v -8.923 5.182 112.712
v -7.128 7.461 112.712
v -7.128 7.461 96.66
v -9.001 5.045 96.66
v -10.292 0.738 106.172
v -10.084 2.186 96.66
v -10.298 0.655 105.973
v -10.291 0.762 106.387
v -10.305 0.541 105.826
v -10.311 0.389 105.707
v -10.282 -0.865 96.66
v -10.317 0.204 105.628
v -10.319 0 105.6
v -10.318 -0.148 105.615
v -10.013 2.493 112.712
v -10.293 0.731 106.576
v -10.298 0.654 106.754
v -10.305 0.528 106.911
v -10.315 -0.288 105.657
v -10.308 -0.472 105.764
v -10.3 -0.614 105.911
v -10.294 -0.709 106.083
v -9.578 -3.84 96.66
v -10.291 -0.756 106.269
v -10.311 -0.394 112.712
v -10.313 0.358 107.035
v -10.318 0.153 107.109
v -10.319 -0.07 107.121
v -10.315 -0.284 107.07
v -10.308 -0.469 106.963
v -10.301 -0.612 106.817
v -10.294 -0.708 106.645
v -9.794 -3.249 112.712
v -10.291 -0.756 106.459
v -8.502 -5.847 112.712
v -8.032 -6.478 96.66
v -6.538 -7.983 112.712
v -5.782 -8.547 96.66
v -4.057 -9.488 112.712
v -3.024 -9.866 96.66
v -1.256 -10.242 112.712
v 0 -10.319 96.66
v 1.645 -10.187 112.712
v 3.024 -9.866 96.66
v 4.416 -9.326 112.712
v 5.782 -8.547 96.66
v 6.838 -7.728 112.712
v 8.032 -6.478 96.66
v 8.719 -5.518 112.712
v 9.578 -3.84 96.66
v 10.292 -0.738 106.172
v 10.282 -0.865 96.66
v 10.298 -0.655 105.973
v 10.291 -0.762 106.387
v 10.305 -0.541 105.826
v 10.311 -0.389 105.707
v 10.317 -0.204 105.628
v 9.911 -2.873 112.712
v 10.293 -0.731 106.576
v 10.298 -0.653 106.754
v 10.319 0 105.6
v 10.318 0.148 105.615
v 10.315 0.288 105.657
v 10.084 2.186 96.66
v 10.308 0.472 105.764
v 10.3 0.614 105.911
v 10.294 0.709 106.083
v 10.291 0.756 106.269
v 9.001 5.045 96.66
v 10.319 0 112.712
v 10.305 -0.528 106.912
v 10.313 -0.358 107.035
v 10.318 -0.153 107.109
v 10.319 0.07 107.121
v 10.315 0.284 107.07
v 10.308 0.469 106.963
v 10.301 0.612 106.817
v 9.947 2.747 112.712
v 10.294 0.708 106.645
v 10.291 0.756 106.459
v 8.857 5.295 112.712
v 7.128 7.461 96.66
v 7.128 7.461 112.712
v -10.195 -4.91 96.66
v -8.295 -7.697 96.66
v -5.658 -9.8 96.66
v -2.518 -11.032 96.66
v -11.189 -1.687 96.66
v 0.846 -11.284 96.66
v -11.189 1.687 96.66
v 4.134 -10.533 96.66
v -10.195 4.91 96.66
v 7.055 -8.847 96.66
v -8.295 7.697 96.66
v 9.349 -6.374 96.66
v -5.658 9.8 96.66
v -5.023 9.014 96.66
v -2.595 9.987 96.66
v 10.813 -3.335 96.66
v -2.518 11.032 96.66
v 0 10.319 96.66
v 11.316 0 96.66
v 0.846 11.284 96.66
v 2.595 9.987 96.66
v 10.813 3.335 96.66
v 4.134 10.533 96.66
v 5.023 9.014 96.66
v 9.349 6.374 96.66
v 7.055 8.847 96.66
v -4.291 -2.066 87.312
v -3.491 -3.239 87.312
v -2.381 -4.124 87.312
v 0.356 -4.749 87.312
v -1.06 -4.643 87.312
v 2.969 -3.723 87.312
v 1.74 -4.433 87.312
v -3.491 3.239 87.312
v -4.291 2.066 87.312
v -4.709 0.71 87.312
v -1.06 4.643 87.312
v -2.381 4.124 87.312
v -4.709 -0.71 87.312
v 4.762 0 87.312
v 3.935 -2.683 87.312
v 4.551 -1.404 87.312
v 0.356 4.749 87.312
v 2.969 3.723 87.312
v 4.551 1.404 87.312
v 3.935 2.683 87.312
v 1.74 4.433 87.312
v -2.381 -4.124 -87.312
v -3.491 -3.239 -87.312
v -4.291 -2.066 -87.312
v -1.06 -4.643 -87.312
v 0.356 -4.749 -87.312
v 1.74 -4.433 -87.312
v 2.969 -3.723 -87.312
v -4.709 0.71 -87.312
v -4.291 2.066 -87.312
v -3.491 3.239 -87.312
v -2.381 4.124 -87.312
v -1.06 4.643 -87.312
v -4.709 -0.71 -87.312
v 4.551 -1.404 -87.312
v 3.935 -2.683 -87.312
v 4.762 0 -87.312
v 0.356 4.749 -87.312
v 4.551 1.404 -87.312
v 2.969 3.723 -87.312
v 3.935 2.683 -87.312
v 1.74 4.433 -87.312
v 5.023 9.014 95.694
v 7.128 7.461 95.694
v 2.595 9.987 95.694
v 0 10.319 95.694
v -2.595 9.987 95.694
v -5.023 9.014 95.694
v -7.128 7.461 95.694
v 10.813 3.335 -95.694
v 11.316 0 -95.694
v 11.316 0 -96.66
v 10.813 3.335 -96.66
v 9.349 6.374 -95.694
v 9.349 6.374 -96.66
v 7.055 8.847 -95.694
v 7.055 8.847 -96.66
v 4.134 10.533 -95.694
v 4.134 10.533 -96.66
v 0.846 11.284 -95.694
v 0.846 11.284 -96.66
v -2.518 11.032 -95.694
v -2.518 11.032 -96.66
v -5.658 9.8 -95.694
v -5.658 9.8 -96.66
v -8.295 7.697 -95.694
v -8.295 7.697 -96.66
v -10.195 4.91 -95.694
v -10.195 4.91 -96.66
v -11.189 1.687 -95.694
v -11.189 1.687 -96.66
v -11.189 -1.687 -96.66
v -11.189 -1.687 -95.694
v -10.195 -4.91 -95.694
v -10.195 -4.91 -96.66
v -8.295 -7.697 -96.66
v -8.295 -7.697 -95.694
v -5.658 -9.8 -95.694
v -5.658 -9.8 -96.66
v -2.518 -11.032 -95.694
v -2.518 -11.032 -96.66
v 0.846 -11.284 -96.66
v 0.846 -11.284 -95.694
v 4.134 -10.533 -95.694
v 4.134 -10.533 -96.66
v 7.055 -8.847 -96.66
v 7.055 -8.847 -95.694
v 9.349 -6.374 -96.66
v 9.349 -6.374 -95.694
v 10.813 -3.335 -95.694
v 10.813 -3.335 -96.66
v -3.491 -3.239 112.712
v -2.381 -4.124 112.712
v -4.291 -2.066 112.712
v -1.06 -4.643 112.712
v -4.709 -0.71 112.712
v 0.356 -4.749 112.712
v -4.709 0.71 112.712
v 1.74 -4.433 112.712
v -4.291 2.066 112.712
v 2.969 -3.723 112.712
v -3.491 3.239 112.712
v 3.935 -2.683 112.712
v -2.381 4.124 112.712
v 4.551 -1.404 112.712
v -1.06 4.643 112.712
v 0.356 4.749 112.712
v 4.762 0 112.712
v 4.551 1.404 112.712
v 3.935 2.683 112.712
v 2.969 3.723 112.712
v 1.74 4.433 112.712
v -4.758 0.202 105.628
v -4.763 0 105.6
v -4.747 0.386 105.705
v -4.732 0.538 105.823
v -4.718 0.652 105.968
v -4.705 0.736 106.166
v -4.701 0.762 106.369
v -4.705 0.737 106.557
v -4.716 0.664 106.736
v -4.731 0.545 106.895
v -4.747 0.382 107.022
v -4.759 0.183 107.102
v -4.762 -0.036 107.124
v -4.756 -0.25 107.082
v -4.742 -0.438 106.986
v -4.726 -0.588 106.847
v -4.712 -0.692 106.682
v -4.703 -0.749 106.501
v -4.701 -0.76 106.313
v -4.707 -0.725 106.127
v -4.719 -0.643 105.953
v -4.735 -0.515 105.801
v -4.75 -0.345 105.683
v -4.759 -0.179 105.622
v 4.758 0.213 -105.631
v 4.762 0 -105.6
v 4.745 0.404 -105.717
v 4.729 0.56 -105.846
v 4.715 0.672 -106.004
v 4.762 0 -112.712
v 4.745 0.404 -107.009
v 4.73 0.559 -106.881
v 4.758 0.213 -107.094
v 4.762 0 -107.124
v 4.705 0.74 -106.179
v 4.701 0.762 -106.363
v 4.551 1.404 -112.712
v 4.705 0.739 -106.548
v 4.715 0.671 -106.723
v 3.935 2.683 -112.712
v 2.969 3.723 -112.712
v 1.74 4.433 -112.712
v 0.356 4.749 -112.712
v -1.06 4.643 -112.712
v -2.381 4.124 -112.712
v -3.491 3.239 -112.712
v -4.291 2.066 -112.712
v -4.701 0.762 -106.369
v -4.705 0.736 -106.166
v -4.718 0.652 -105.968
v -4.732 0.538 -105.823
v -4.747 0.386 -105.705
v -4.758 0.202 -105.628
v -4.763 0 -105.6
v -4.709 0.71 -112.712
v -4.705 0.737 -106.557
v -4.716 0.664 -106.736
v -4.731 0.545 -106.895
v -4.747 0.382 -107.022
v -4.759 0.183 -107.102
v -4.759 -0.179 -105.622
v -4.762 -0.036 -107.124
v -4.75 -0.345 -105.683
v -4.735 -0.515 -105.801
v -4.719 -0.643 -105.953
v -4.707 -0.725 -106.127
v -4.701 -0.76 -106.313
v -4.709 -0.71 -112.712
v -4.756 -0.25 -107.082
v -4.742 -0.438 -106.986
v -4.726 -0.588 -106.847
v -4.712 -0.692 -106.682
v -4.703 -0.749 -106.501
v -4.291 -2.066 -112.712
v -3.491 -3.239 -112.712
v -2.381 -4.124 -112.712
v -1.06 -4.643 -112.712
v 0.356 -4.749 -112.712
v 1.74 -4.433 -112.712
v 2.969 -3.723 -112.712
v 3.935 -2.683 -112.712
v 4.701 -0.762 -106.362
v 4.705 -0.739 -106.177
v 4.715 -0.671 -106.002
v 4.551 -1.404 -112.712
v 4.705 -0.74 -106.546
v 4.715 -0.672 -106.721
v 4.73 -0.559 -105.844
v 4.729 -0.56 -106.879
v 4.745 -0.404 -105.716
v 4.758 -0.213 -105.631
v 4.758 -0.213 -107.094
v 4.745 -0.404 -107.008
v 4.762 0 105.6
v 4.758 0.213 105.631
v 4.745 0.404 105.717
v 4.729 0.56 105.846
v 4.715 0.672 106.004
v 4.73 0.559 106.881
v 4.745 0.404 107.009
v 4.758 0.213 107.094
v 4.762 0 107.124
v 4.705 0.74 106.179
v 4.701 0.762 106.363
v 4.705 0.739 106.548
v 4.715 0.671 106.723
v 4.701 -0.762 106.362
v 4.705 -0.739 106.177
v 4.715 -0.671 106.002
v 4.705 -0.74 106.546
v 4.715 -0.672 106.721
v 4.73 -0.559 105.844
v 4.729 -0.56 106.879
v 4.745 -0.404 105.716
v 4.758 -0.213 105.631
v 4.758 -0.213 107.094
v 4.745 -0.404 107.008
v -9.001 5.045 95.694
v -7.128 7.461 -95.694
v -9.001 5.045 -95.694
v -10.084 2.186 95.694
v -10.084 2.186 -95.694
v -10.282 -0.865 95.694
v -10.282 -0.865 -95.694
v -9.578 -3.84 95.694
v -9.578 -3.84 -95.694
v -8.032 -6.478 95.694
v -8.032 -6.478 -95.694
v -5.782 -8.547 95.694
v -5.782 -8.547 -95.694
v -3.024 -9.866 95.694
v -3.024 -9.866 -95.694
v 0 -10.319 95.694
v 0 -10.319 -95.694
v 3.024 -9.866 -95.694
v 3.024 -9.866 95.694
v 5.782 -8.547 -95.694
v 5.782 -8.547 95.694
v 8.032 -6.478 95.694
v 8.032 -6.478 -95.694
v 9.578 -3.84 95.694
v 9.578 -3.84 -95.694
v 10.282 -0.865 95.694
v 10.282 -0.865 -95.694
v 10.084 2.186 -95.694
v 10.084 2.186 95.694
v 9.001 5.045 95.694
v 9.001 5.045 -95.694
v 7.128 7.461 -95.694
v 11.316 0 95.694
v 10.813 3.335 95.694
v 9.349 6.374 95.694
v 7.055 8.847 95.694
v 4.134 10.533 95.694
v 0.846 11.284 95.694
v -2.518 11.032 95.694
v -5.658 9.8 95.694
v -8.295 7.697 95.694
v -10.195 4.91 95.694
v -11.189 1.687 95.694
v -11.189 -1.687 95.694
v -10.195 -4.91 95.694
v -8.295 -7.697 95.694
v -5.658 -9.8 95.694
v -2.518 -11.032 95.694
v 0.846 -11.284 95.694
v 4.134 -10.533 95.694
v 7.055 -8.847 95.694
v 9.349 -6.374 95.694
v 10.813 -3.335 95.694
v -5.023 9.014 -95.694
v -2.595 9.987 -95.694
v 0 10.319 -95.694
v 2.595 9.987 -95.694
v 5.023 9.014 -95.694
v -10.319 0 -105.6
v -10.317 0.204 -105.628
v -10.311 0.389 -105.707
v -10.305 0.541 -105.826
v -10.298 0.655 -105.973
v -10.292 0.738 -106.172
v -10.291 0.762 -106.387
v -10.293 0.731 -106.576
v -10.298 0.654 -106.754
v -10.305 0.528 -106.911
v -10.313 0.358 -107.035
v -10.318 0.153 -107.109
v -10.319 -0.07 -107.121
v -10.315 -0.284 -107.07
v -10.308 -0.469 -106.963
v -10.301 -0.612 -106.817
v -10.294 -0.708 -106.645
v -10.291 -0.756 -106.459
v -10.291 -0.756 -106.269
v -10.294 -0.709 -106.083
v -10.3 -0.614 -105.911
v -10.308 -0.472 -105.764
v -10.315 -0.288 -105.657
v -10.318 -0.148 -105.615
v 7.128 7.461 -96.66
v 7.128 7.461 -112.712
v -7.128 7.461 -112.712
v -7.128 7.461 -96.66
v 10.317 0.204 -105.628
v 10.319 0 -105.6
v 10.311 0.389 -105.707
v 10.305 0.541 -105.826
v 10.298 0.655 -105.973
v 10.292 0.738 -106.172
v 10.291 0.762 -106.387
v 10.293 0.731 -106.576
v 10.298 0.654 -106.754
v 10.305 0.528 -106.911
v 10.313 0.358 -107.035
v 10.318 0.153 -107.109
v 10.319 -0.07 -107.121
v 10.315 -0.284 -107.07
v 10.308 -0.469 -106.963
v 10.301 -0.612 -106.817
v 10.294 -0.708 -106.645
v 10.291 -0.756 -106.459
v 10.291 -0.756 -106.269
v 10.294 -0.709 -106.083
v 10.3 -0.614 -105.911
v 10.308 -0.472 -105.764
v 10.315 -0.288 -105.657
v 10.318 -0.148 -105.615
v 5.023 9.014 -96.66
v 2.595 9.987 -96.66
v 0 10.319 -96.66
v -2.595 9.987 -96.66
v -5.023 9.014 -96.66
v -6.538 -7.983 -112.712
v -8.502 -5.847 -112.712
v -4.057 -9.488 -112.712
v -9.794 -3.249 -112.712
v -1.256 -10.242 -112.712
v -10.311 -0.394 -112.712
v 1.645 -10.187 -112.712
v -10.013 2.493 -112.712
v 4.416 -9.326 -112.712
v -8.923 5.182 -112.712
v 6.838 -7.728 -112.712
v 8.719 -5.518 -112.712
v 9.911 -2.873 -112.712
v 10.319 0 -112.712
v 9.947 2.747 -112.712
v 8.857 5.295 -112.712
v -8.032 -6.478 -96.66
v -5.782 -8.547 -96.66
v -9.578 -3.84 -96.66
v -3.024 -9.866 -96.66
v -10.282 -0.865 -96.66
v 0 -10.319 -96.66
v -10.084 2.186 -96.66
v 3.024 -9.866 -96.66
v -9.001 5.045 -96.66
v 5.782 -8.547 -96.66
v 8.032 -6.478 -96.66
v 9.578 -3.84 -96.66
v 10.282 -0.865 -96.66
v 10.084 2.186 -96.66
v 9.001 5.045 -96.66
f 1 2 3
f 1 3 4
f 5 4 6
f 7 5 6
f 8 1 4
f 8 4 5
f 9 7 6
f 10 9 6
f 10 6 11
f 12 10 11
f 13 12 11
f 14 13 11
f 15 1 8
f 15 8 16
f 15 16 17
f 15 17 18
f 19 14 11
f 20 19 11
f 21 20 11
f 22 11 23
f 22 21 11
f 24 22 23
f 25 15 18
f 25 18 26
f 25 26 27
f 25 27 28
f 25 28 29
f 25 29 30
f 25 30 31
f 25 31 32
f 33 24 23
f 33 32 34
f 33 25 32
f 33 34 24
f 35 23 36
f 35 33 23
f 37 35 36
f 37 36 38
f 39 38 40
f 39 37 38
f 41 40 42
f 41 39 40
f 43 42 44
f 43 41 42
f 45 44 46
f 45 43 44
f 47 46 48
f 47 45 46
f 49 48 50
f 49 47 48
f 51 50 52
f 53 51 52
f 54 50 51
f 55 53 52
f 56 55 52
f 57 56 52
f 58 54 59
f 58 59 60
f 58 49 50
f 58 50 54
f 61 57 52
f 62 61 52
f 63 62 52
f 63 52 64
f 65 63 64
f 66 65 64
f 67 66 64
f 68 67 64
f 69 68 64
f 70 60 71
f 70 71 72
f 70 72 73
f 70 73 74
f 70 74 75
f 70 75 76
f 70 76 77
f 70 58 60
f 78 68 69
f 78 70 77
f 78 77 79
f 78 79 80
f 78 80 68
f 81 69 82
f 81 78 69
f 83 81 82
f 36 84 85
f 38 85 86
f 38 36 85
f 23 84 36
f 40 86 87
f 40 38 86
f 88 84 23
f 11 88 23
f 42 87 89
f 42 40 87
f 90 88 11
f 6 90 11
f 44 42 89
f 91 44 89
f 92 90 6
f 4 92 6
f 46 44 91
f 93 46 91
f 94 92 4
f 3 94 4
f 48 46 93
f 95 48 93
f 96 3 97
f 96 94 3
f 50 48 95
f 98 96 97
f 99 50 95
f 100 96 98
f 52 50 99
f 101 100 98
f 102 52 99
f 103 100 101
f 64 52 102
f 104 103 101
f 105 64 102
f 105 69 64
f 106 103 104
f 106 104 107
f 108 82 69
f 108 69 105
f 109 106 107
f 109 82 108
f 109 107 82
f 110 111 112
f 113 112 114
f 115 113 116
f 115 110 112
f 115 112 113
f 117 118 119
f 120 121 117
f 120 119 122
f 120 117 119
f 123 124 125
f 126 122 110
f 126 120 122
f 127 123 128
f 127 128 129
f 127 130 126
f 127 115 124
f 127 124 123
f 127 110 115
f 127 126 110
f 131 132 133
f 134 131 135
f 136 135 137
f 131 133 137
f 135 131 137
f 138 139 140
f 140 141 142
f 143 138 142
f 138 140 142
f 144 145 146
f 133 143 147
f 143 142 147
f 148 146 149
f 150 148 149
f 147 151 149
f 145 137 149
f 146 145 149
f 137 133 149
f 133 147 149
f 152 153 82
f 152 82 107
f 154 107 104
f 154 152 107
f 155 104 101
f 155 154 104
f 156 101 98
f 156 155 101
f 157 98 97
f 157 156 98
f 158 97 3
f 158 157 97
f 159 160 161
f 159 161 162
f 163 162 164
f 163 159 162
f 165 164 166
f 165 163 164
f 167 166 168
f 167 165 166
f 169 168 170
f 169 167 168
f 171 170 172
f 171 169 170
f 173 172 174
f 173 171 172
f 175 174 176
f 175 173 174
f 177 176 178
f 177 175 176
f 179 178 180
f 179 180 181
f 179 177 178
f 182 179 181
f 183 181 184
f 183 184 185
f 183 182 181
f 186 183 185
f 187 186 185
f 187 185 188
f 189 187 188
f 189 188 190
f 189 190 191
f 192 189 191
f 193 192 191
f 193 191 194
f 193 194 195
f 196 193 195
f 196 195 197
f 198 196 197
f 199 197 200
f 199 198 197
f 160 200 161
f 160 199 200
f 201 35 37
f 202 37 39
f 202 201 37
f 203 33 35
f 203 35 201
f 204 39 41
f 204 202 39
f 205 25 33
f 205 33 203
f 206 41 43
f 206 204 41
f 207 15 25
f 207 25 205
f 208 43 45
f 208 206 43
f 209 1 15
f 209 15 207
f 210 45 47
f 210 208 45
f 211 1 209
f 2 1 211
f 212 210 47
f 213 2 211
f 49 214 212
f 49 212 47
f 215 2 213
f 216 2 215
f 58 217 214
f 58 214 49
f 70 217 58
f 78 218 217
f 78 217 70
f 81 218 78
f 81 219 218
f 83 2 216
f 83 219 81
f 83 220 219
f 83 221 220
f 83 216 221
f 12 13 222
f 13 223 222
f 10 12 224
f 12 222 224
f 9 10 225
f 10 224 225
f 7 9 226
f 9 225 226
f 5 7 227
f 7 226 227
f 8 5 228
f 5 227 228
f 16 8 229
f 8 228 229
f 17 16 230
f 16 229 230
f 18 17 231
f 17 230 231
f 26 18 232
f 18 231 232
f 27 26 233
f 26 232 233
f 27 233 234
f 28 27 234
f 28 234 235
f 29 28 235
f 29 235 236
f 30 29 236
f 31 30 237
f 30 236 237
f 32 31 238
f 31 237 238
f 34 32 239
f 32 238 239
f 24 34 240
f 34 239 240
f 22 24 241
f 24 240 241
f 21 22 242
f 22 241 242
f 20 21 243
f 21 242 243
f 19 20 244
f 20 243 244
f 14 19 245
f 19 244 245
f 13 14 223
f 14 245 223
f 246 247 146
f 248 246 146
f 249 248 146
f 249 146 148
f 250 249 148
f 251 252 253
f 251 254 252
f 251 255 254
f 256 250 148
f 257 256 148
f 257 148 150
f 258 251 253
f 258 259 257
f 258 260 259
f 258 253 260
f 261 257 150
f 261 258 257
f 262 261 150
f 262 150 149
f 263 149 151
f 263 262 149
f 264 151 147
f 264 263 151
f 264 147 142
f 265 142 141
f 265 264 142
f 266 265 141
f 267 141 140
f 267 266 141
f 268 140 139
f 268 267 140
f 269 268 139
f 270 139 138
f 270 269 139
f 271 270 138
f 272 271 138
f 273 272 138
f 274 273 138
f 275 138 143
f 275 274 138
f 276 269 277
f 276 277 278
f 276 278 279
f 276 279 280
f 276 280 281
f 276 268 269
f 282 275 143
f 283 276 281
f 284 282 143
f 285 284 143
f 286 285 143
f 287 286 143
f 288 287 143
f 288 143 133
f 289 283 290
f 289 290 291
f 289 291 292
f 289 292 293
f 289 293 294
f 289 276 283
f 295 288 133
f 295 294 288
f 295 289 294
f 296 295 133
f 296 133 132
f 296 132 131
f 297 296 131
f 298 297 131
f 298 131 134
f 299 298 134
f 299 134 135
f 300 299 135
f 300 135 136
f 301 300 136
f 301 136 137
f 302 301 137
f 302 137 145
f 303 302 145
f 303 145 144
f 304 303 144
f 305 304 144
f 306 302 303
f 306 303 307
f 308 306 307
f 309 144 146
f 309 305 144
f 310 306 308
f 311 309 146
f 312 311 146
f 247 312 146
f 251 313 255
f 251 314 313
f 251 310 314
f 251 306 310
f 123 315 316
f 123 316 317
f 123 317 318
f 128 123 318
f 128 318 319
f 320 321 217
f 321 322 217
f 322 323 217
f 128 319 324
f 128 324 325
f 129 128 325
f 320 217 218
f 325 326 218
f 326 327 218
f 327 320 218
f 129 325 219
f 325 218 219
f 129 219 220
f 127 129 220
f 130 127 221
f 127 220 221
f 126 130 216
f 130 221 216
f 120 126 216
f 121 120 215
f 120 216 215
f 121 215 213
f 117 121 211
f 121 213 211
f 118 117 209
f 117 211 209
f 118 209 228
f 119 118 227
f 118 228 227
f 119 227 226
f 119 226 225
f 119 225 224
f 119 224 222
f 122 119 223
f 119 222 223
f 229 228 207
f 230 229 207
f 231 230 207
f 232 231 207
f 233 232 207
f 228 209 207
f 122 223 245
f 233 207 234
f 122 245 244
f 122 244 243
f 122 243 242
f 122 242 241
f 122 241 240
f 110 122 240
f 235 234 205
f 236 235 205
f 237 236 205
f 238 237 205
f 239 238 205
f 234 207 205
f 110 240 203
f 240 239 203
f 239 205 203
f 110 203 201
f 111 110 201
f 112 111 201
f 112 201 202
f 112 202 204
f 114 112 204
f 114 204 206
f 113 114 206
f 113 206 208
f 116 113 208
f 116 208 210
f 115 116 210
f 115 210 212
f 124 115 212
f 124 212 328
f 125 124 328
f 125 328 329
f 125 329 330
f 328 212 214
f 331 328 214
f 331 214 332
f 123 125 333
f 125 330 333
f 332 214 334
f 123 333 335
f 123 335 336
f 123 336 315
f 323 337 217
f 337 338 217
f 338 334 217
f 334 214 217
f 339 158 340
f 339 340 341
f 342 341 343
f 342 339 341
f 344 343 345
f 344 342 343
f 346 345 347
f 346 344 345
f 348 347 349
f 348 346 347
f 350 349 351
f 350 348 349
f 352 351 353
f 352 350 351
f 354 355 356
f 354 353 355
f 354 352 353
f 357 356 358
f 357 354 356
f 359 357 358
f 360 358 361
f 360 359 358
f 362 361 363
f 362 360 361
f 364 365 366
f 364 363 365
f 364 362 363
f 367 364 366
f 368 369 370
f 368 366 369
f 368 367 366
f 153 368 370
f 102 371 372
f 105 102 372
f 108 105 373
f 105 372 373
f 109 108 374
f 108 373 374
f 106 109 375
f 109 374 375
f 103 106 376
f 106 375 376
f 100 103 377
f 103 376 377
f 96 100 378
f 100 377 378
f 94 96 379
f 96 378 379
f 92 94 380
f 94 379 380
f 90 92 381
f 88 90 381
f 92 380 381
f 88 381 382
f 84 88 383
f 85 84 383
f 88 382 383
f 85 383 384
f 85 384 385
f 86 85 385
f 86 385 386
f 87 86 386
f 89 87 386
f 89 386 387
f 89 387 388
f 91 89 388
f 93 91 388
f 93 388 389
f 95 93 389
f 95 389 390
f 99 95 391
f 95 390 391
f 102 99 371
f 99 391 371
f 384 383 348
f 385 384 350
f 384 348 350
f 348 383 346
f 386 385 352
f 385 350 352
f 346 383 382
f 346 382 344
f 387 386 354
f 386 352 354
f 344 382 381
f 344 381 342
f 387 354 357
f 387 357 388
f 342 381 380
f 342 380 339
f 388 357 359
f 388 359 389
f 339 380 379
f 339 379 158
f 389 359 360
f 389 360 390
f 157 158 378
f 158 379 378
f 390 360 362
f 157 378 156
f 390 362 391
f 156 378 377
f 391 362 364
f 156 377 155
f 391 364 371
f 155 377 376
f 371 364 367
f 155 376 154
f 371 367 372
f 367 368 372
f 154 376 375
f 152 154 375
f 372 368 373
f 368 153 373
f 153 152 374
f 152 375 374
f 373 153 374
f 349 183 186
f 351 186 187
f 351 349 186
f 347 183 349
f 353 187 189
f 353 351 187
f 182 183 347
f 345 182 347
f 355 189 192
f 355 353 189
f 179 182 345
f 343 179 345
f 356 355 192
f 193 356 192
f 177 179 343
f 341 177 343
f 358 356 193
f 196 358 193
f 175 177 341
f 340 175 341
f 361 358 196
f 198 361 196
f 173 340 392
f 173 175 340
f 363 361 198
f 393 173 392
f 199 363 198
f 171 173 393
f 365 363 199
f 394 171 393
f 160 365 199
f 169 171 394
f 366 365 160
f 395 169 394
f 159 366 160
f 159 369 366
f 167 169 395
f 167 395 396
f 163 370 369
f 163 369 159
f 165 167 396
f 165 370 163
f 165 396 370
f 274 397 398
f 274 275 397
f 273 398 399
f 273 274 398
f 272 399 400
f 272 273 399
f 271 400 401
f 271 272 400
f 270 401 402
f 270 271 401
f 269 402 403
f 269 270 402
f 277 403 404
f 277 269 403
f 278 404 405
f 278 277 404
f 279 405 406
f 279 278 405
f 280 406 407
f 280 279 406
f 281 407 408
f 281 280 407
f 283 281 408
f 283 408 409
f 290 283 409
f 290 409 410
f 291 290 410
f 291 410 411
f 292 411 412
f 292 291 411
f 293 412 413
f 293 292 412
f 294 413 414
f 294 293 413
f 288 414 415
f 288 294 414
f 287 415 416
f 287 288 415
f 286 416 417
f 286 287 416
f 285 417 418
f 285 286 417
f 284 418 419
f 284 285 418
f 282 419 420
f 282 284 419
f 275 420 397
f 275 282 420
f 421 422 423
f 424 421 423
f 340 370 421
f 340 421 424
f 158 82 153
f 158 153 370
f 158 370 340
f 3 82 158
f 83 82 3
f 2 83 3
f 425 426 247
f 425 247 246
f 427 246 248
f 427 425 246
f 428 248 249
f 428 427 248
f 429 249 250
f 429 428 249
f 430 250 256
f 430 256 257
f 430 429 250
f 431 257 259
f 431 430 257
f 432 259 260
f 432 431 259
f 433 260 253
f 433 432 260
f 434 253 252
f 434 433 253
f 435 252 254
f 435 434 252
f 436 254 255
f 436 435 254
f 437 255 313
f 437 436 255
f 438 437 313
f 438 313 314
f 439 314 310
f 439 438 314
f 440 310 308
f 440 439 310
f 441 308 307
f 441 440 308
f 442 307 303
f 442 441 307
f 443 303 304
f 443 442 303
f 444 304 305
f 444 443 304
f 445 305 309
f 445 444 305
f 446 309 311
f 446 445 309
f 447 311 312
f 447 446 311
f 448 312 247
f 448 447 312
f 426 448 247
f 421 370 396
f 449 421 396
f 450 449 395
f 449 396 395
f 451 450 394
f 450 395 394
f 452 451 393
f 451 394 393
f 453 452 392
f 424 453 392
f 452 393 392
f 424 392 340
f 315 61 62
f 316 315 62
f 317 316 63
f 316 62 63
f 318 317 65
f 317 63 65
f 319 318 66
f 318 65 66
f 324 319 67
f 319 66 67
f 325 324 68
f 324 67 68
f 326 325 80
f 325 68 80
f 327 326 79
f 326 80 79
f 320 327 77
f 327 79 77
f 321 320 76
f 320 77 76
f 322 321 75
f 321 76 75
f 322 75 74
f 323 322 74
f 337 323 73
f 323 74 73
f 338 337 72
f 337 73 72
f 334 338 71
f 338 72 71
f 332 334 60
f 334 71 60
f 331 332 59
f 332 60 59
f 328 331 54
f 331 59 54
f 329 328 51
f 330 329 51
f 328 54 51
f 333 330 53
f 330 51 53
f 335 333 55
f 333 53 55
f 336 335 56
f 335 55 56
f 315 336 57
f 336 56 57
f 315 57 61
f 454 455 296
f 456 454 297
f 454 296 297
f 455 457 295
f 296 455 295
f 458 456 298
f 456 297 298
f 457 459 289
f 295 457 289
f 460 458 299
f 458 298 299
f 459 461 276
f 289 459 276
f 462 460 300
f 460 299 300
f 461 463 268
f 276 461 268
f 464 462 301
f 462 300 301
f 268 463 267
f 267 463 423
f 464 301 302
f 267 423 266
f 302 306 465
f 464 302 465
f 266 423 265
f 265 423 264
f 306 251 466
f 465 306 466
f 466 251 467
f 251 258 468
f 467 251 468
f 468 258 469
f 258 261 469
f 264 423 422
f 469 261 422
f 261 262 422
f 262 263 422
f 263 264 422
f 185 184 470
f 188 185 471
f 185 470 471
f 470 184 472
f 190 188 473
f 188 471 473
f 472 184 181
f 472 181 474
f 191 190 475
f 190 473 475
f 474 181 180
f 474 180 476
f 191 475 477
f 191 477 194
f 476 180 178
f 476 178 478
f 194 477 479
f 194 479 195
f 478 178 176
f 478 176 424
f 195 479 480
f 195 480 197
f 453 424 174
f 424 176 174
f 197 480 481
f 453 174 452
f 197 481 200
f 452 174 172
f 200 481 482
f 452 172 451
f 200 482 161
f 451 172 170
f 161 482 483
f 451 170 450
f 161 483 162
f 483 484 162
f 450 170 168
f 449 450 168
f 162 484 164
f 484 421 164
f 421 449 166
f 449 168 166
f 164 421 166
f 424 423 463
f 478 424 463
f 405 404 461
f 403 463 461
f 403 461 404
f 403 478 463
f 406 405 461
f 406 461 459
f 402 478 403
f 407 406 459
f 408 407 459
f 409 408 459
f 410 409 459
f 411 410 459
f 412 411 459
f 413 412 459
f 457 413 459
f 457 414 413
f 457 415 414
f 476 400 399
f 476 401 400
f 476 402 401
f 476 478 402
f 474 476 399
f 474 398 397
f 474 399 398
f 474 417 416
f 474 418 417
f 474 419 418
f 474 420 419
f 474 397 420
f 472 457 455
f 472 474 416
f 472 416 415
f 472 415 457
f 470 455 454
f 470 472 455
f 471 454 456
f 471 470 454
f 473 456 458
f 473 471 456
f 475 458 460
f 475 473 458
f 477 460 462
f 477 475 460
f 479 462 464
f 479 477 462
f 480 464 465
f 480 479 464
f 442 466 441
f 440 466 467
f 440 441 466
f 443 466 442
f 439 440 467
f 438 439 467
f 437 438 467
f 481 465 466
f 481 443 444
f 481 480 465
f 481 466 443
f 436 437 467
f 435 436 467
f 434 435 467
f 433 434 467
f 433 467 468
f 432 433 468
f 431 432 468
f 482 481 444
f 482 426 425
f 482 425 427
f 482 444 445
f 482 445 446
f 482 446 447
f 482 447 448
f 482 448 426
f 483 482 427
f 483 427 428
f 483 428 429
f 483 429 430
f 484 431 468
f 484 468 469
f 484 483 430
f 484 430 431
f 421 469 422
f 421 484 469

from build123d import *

# Parameters (mm, degrees)
RACK_DEPTH             = 112.7125
RACK_DEPTH_BACK        = 112.7125
SKETCH2_R              = 4.7625
END_HOLE_DEPTH         = 25.4
BUMP_START             = -17.018
SKETCH3_R              = 11.3157
SKETCH3_R_2            = 10.31875
BUMP_STOP_DEPTH        = 0.9652
SKETCH4_R              = 0.762
SAFETY_WIRE_HOLE_DEPTH = 12.3157


with BuildPart() as part:
    # Sketch1 → Rack (new body, two sides)
    with BuildSketch(Plane.XY) as rack_sk:
        with BuildLine():
            Line((7.127857322, 7.46125), (-7.127857322, 7.46125))
            ThreePointArc((-7.127857322, 7.46125), (-4.057463729, -9.487549191), (10.31875, 0))
            ThreePointArc((10.31875, 0), (9.487549191, 4.057463729), (7.127857322, 7.46125))
        make_face()
    extrude(amount=RACK_DEPTH)
    extrude(rack_sk.sketch, amount=-RACK_DEPTH_BACK)

    # Sketch2 → End Hole (cut)
    with BuildSketch(Plane.XY.offset(112.7125)):
        Circle(SKETCH2_R)
    end_hole = extrude(amount=-END_HOLE_DEPTH, mode=Mode.SUBTRACT)

    # Sketch3 → Bump Stop (add)
    with BuildSketch(Plane.XY.offset(112.7125).offset(BUMP_START)):
        Circle(SKETCH3_R)
        Circle(SKETCH3_R_2, mode=Mode.SUBTRACT)
    bump_stop = extrude(amount=BUMP_STOP_DEPTH)

    # Sketch4 → Safety Wire Hole (cut, symmetric)
    with BuildSketch(Plane(origin=(0, 0, 0), x_dir=(0, 0, -1), z_dir=(1, 0, 0))):
        with Locations((-106.3625, 0)):
            Circle(SKETCH4_R)
    safety_wire_hole = extrude(amount=SAFETY_WIRE_HOLE_DEPTH, both=True, mode=Mode.SUBTRACT)

    # Rack Mirror: End Hole, Bump Stop, Safety Wire Hole across plane
    add(end_hole.mirror(Plane.XY), mode=Mode.SUBTRACT)
    add(bump_stop.mirror(Plane.XY))
    add(safety_wire_hole.mirror(Plane.XY), mode=Mode.SUBTRACT)


solid = part.part
